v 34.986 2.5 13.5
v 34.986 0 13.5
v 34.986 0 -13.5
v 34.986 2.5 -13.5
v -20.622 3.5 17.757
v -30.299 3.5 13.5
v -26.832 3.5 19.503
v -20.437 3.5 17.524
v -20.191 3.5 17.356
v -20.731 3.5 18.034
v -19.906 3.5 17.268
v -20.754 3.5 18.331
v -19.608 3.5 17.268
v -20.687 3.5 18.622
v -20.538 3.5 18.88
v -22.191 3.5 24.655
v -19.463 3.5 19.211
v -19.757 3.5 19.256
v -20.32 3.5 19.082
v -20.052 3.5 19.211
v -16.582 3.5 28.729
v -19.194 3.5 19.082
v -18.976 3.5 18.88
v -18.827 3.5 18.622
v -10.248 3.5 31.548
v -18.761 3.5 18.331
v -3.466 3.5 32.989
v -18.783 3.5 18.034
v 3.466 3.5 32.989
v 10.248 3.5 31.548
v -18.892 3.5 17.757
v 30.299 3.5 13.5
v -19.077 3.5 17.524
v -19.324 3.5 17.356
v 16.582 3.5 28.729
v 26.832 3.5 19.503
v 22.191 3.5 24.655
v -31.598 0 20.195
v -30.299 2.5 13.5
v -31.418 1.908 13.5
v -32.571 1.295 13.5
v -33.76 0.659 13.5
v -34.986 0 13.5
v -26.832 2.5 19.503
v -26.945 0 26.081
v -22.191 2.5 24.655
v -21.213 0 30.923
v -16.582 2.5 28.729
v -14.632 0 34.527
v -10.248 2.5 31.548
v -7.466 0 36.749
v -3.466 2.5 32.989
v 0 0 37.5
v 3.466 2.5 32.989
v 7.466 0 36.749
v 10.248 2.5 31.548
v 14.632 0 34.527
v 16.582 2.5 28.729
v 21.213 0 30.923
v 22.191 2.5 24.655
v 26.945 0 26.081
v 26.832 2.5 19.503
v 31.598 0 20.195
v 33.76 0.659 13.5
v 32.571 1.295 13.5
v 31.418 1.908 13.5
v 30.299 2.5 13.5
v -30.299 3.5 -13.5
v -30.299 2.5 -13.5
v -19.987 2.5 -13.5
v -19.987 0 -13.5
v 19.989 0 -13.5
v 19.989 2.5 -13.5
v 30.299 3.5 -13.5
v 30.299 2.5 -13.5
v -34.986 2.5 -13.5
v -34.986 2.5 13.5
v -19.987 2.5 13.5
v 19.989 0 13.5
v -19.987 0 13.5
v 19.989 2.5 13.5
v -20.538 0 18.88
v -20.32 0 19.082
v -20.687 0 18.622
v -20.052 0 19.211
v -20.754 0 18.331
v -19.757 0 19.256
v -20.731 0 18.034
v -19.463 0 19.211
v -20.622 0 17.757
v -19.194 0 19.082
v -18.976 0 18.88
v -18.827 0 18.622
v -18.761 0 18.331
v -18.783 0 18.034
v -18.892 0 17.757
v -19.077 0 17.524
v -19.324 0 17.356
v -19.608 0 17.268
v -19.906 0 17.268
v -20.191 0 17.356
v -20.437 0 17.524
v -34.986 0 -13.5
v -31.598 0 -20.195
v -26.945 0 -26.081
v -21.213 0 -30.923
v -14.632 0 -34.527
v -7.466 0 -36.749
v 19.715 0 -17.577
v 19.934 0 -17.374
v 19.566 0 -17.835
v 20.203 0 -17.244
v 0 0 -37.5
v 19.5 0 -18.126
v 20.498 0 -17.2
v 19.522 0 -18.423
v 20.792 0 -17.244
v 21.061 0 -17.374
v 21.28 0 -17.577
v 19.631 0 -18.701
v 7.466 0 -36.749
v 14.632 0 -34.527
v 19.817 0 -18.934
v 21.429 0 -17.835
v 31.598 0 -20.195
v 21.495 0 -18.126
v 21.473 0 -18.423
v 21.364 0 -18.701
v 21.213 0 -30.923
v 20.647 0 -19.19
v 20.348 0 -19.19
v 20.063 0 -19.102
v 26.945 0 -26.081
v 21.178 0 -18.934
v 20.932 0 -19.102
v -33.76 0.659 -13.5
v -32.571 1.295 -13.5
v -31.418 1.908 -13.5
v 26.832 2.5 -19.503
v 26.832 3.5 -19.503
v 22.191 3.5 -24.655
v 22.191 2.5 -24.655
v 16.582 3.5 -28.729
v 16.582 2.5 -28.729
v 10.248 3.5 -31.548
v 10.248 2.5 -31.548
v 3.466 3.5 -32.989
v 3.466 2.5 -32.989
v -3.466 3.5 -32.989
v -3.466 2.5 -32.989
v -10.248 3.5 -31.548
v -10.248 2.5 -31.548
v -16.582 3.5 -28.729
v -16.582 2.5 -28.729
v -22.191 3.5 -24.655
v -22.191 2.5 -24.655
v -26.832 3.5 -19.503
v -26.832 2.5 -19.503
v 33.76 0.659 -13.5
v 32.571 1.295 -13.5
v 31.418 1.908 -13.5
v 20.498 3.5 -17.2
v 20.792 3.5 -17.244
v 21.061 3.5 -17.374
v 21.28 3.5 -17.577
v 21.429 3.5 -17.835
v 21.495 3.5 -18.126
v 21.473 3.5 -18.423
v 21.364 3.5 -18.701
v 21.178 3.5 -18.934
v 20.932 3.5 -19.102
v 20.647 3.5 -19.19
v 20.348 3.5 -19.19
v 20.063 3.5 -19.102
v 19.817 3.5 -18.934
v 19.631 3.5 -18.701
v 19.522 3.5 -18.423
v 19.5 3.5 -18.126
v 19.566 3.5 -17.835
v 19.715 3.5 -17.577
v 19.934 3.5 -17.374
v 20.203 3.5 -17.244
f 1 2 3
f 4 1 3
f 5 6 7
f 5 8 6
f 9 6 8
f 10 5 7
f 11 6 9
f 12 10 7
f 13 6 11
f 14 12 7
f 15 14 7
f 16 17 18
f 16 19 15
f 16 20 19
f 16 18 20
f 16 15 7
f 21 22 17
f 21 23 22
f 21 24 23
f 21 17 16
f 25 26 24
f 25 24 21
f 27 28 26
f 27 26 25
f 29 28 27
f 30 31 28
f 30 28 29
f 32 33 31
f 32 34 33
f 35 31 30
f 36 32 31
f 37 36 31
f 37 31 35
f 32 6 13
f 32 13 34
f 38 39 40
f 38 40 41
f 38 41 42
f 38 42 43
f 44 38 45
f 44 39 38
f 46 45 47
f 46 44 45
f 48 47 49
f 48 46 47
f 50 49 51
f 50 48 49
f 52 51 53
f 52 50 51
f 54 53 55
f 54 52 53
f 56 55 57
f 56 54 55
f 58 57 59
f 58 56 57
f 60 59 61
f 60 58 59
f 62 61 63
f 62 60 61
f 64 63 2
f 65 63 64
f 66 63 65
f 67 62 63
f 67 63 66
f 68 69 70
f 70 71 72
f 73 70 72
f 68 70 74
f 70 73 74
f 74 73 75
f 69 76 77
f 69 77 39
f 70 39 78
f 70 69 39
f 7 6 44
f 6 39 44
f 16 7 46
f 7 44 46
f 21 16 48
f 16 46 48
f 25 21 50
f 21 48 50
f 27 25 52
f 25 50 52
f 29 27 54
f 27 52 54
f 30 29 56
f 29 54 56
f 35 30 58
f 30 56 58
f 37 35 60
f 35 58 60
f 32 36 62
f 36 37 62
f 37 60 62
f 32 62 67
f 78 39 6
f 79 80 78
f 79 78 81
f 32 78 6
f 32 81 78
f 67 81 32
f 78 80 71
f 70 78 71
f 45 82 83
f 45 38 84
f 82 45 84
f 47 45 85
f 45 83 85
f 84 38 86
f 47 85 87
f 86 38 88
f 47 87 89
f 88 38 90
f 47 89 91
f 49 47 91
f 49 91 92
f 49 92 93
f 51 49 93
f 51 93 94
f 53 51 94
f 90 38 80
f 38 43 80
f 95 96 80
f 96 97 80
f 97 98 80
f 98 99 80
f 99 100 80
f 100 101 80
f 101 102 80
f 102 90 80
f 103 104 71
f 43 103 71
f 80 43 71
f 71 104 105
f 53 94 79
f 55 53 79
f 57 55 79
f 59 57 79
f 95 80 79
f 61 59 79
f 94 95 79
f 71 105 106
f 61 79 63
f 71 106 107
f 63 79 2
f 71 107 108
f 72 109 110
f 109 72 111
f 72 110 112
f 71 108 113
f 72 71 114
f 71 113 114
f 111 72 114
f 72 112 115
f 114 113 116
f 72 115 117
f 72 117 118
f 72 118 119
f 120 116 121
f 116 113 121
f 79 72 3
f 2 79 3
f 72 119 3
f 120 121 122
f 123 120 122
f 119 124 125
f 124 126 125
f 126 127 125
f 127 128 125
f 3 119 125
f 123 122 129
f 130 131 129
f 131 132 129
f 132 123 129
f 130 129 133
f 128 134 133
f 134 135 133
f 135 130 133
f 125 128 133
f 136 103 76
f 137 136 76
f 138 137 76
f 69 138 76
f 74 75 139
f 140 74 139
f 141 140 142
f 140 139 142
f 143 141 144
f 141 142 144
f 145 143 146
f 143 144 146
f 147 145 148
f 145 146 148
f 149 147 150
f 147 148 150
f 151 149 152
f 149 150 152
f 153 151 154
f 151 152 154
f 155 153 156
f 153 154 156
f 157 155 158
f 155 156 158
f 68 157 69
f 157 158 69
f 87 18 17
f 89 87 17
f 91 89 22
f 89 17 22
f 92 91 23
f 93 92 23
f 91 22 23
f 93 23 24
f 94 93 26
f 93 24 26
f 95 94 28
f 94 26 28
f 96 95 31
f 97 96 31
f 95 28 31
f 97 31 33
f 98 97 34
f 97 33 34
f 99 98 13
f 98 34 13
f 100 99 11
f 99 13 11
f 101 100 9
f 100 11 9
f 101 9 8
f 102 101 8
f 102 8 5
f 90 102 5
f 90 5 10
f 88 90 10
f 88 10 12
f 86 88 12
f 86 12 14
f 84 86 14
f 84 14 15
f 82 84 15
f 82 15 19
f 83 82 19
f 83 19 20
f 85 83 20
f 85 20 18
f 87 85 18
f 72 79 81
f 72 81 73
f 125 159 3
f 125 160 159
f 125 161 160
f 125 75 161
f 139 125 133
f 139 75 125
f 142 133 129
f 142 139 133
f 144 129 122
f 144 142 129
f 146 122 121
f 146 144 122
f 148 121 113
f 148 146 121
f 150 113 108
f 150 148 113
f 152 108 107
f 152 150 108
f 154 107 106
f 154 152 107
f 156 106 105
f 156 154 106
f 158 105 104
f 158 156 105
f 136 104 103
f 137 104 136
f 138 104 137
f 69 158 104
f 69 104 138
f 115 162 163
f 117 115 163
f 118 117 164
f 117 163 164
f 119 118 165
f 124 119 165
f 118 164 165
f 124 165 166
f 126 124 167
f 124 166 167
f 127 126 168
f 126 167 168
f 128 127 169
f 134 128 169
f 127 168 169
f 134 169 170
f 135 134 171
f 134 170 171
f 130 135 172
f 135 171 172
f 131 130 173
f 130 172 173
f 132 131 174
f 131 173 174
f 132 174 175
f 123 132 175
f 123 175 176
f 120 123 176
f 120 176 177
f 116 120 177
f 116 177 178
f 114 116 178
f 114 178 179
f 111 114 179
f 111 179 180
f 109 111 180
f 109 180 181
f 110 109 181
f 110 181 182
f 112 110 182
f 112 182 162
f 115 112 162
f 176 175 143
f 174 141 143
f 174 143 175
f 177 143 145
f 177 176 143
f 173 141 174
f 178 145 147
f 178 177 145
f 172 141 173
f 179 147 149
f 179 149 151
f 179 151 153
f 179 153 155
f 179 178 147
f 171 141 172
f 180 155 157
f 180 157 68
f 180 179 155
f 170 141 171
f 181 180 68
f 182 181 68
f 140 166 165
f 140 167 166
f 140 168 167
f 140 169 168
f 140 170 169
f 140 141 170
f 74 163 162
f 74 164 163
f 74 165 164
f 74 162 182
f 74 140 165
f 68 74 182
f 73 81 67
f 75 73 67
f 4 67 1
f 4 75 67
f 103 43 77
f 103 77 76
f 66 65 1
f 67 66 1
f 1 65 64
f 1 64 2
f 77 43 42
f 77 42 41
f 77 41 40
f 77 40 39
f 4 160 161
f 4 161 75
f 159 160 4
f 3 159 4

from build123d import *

# Parameters (mm, degrees)
SKETCH7_R           = 33.17091481
BOSS_EXTRUDE2_DEPTH = 1
SKETCH13_W          = 75
SKETCH13_H          = 27
CUT_EXTRUDE2_DEPTH  = 54.148377209
SKETCH18_W          = 14.996875164
SKETCH18_H          = 27
BOSS_EXTRUDE4_DEPTH = 2.5
SKETCH18_3_W        = 14.996875164
SKETCH18_3_H        = 27
SKETCH18_3_W_2      = 14.998441489
BOSS_EXTRUDE5_DEPTH = 2.5
SKETCH20_R          = 0.999251596
SKETCH20_R_2        = 1.000371823
CUT_EXTRUDE3_DEPTH  = 52.40525265


with BuildPart() as part:
    # Sketch3 → Revolve1 (revolve)
    with BuildSketch(Plane.XY):
        Polygon((0, 0), (37.5, 0), (33.17091481, 2.5), (0, 2.5), align=None)
    revolve(axis=Axis((0, 0, 0), (0, 1, 0)))

    # Sketch7 → Boss-Extrude2 (add)
    with BuildSketch(Plane(origin=(0, 2.5, 0), x_dir=(1, 0, 0), z_dir=(0, 1, 0))):
        Circle(SKETCH7_R)
    extrude(amount=BOSS_EXTRUDE2_DEPTH)

    # Sketch13 → Cut-Extrude2 (cut, through all)
    with BuildSketch(Plane.XZ):
        Rectangle(SKETCH13_W, SKETCH13_H)
    extrude(amount=-CUT_EXTRUDE2_DEPTH, mode=Mode.SUBTRACT)


with BuildPart() as cut_extrude2_piece_1:
    # of the separate pieces the step leaves, piece 1, a body of its own (cut_extrude2_pieces)
    add(part.part.solids().sort_by_distance((-34.985711369, 0, 13.5))[0])



with BuildPart() as cut_extrude2_piece_2:
    # of the separate pieces the step leaves, piece 2, a body of its own (cut_extrude2_pieces)
    add(part.part.solids().sort_by_distance((34.985711369, 0, -13.5))[0])


with BuildPart() as cut_extrude2_piece_1_1:
    add(cut_extrude2_piece_1.part)

    add(cut_extrude2_piece_2.part)  # Boss-Extrude4 merges Cut-Extrude2 piece 2
    # Sketch18 → Boss-Extrude4 (add)
    with BuildSketch(Plane(origin=(0, 0, 0), x_dir=(1, 0, 0), z_dir=(0, 1, 0))):
        with Locations((27.487273787, 0)):
            Rectangle(SKETCH18_W, SKETCH18_H)
    extrude(amount=BOSS_EXTRUDE4_DEPTH)

    # Sketch18<3> → Boss-Extrude5 (add)
    with BuildSketch(Plane(origin=(0, 0, 0), x_dir=(1, 0, 0), z_dir=(0, 1, 0))):
        with Locations((27.487273787, 0)):
            Rectangle(SKETCH18_3_W, SKETCH18_3_H)
        with Locations((-27.486490625, 0)):
            Rectangle(SKETCH18_3_W_2, SKETCH18_3_H)
    extrude(amount=BOSS_EXTRUDE5_DEPTH)

    # Sketch20 → Cut-Extrude3 (cut, through all)
    with BuildSketch(Plane(origin=(0, 3.5, 0), x_dir=(1, 0, 0), z_dir=(0, 1, 0))):
        with Locations((-19.757076847, -18.256562674)):
            Circle(SKETCH20_R)
        with Locations((20.497529554, 18.200406752)):
            Circle(SKETCH20_R_2)
    extrude(amount=-CUT_EXTRUDE3_DEPTH, mode=Mode.SUBTRACT)


solid = cut_extrude2_piece_1_1.part
